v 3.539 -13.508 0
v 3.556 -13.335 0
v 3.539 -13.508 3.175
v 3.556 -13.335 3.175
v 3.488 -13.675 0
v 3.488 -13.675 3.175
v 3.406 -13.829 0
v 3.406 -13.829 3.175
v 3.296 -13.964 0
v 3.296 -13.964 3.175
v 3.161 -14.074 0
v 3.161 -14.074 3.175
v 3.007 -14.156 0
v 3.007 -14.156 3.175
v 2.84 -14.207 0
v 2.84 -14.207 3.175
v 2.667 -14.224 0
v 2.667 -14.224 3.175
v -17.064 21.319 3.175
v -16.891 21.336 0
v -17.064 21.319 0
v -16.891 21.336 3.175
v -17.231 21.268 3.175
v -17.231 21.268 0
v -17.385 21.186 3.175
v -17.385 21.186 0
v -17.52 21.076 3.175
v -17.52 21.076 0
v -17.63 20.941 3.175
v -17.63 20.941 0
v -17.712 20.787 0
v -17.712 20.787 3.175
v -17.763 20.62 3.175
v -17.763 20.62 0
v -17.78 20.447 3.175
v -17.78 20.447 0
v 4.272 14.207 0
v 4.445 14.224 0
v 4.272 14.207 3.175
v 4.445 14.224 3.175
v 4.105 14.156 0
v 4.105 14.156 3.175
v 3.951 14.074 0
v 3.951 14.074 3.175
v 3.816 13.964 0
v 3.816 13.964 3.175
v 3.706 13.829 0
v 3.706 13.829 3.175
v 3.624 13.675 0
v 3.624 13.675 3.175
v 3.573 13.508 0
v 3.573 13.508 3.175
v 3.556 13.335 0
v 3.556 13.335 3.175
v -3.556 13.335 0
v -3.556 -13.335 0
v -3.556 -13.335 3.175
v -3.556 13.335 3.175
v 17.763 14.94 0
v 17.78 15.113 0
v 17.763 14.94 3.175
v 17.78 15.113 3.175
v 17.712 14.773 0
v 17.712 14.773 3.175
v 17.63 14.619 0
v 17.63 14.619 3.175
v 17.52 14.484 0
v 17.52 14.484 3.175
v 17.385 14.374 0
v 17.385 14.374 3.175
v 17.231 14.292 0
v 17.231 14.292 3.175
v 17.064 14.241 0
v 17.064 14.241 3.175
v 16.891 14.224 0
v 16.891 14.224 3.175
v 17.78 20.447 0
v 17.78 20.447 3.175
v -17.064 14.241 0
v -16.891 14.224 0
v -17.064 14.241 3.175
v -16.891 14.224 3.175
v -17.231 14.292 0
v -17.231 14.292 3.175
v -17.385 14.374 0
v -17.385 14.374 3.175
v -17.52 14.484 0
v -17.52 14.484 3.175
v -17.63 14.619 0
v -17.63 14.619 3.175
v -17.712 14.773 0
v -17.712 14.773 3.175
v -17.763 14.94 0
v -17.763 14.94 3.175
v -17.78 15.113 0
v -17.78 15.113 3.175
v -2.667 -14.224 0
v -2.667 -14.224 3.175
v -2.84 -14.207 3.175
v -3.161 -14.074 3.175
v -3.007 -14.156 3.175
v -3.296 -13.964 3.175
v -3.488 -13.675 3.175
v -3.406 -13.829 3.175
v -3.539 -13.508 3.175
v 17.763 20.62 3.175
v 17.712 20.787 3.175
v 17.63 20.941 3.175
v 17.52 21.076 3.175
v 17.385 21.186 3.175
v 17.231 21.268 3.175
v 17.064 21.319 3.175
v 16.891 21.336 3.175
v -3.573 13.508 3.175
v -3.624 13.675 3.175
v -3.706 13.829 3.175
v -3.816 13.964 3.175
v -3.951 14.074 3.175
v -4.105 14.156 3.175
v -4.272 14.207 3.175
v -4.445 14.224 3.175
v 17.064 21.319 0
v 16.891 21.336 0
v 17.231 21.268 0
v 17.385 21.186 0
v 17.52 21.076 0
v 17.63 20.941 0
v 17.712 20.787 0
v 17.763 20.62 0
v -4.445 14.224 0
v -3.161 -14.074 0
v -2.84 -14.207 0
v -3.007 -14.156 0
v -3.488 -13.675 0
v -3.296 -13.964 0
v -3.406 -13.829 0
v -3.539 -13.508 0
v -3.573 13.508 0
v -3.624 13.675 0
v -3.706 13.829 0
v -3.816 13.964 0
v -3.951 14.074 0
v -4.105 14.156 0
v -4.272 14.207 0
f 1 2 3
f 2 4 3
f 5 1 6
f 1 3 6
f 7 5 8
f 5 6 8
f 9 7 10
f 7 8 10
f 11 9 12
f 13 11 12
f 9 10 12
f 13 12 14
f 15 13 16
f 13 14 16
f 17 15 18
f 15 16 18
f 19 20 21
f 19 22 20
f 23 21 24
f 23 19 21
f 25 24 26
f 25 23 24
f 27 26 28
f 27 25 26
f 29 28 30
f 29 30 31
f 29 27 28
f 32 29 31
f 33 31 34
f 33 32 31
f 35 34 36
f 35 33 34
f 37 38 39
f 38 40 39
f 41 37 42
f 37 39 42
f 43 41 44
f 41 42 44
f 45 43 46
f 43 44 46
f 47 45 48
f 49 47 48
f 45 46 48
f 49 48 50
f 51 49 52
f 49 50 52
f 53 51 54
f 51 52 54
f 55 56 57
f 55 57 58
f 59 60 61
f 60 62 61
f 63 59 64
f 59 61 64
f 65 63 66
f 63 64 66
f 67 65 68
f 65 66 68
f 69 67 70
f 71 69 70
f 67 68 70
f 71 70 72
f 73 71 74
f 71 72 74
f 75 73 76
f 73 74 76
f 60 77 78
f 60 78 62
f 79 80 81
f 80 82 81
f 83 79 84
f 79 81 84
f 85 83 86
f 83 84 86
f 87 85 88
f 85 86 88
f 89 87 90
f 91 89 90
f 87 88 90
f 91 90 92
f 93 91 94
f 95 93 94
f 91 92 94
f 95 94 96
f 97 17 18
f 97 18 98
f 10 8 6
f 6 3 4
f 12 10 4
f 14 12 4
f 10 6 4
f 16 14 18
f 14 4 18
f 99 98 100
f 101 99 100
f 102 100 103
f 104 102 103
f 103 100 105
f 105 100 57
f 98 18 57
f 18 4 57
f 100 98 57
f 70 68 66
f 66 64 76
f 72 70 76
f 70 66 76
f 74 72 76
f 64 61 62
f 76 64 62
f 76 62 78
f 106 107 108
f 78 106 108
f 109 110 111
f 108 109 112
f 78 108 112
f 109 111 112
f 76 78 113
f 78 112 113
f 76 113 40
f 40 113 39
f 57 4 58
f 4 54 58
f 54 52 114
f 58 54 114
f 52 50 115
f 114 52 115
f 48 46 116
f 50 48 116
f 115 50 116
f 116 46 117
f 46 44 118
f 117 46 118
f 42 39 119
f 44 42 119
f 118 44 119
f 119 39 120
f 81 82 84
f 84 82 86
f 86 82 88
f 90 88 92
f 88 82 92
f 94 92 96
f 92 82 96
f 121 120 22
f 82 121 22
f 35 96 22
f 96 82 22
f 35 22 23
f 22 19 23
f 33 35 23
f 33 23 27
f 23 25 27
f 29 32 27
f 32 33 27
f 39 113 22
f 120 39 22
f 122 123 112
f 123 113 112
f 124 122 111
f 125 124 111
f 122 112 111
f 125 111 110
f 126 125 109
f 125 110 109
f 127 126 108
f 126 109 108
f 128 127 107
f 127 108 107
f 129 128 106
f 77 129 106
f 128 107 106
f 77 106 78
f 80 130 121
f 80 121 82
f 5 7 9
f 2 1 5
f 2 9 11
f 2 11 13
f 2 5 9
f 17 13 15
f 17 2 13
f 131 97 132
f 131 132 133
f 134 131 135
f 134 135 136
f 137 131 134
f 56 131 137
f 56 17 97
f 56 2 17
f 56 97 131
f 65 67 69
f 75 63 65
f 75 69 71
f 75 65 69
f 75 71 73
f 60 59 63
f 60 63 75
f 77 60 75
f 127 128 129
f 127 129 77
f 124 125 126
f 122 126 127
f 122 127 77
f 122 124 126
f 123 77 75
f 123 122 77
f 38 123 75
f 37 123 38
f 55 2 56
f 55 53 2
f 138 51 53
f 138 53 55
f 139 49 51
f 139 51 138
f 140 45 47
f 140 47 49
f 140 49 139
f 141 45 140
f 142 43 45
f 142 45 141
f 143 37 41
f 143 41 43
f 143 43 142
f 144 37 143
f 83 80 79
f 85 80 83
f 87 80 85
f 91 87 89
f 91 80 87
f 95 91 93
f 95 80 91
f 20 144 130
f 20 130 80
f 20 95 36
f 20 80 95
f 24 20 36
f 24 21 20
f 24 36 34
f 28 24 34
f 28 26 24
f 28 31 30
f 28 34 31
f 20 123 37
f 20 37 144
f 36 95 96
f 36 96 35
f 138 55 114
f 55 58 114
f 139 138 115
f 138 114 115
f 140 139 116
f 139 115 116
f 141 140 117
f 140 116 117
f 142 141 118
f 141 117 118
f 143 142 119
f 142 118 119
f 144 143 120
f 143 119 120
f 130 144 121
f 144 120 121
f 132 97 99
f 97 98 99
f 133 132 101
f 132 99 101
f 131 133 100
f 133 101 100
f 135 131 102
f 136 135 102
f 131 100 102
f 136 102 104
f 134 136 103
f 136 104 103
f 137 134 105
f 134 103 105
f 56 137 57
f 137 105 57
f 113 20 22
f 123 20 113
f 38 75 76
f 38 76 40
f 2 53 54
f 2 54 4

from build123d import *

# Parameters (mm, degrees)
PAD_DEPTH = 3.175
FILLET_R  = 0.889


with BuildPart() as part:
    # Sketch → Pad (new body)
    with BuildSketch(Plane.XY):
        Polygon((-17.78, 21.336), (17.78, 21.336), (17.78, 14.224), (3.556, 14.224), (3.556, -14.224), (-3.556, -14.224), (-3.556, 14.224), (-17.78, 14.224), align=None)
    extrude(amount=PAD_DEPTH)

    # Fillet
    fillet_edges = [part.edges().sort_by_distance(p)[0] for p in [
        (-17.78, 21.336, 1.5875),
        (-17.78, 14.224, 1.5875),
        (-3.556, 14.224, 1.5875),
        (17.78, 14.224, 1.5875),
        (-3.556, -14.224, 1.5875),
        (3.556, -14.224, 1.5875),
        (17.78, 21.336, 1.5875),
        (3.556, 14.224, 1.5875),
    ]]
    fillet(fillet_edges, radius=FILLET_R)


solid = part.part
